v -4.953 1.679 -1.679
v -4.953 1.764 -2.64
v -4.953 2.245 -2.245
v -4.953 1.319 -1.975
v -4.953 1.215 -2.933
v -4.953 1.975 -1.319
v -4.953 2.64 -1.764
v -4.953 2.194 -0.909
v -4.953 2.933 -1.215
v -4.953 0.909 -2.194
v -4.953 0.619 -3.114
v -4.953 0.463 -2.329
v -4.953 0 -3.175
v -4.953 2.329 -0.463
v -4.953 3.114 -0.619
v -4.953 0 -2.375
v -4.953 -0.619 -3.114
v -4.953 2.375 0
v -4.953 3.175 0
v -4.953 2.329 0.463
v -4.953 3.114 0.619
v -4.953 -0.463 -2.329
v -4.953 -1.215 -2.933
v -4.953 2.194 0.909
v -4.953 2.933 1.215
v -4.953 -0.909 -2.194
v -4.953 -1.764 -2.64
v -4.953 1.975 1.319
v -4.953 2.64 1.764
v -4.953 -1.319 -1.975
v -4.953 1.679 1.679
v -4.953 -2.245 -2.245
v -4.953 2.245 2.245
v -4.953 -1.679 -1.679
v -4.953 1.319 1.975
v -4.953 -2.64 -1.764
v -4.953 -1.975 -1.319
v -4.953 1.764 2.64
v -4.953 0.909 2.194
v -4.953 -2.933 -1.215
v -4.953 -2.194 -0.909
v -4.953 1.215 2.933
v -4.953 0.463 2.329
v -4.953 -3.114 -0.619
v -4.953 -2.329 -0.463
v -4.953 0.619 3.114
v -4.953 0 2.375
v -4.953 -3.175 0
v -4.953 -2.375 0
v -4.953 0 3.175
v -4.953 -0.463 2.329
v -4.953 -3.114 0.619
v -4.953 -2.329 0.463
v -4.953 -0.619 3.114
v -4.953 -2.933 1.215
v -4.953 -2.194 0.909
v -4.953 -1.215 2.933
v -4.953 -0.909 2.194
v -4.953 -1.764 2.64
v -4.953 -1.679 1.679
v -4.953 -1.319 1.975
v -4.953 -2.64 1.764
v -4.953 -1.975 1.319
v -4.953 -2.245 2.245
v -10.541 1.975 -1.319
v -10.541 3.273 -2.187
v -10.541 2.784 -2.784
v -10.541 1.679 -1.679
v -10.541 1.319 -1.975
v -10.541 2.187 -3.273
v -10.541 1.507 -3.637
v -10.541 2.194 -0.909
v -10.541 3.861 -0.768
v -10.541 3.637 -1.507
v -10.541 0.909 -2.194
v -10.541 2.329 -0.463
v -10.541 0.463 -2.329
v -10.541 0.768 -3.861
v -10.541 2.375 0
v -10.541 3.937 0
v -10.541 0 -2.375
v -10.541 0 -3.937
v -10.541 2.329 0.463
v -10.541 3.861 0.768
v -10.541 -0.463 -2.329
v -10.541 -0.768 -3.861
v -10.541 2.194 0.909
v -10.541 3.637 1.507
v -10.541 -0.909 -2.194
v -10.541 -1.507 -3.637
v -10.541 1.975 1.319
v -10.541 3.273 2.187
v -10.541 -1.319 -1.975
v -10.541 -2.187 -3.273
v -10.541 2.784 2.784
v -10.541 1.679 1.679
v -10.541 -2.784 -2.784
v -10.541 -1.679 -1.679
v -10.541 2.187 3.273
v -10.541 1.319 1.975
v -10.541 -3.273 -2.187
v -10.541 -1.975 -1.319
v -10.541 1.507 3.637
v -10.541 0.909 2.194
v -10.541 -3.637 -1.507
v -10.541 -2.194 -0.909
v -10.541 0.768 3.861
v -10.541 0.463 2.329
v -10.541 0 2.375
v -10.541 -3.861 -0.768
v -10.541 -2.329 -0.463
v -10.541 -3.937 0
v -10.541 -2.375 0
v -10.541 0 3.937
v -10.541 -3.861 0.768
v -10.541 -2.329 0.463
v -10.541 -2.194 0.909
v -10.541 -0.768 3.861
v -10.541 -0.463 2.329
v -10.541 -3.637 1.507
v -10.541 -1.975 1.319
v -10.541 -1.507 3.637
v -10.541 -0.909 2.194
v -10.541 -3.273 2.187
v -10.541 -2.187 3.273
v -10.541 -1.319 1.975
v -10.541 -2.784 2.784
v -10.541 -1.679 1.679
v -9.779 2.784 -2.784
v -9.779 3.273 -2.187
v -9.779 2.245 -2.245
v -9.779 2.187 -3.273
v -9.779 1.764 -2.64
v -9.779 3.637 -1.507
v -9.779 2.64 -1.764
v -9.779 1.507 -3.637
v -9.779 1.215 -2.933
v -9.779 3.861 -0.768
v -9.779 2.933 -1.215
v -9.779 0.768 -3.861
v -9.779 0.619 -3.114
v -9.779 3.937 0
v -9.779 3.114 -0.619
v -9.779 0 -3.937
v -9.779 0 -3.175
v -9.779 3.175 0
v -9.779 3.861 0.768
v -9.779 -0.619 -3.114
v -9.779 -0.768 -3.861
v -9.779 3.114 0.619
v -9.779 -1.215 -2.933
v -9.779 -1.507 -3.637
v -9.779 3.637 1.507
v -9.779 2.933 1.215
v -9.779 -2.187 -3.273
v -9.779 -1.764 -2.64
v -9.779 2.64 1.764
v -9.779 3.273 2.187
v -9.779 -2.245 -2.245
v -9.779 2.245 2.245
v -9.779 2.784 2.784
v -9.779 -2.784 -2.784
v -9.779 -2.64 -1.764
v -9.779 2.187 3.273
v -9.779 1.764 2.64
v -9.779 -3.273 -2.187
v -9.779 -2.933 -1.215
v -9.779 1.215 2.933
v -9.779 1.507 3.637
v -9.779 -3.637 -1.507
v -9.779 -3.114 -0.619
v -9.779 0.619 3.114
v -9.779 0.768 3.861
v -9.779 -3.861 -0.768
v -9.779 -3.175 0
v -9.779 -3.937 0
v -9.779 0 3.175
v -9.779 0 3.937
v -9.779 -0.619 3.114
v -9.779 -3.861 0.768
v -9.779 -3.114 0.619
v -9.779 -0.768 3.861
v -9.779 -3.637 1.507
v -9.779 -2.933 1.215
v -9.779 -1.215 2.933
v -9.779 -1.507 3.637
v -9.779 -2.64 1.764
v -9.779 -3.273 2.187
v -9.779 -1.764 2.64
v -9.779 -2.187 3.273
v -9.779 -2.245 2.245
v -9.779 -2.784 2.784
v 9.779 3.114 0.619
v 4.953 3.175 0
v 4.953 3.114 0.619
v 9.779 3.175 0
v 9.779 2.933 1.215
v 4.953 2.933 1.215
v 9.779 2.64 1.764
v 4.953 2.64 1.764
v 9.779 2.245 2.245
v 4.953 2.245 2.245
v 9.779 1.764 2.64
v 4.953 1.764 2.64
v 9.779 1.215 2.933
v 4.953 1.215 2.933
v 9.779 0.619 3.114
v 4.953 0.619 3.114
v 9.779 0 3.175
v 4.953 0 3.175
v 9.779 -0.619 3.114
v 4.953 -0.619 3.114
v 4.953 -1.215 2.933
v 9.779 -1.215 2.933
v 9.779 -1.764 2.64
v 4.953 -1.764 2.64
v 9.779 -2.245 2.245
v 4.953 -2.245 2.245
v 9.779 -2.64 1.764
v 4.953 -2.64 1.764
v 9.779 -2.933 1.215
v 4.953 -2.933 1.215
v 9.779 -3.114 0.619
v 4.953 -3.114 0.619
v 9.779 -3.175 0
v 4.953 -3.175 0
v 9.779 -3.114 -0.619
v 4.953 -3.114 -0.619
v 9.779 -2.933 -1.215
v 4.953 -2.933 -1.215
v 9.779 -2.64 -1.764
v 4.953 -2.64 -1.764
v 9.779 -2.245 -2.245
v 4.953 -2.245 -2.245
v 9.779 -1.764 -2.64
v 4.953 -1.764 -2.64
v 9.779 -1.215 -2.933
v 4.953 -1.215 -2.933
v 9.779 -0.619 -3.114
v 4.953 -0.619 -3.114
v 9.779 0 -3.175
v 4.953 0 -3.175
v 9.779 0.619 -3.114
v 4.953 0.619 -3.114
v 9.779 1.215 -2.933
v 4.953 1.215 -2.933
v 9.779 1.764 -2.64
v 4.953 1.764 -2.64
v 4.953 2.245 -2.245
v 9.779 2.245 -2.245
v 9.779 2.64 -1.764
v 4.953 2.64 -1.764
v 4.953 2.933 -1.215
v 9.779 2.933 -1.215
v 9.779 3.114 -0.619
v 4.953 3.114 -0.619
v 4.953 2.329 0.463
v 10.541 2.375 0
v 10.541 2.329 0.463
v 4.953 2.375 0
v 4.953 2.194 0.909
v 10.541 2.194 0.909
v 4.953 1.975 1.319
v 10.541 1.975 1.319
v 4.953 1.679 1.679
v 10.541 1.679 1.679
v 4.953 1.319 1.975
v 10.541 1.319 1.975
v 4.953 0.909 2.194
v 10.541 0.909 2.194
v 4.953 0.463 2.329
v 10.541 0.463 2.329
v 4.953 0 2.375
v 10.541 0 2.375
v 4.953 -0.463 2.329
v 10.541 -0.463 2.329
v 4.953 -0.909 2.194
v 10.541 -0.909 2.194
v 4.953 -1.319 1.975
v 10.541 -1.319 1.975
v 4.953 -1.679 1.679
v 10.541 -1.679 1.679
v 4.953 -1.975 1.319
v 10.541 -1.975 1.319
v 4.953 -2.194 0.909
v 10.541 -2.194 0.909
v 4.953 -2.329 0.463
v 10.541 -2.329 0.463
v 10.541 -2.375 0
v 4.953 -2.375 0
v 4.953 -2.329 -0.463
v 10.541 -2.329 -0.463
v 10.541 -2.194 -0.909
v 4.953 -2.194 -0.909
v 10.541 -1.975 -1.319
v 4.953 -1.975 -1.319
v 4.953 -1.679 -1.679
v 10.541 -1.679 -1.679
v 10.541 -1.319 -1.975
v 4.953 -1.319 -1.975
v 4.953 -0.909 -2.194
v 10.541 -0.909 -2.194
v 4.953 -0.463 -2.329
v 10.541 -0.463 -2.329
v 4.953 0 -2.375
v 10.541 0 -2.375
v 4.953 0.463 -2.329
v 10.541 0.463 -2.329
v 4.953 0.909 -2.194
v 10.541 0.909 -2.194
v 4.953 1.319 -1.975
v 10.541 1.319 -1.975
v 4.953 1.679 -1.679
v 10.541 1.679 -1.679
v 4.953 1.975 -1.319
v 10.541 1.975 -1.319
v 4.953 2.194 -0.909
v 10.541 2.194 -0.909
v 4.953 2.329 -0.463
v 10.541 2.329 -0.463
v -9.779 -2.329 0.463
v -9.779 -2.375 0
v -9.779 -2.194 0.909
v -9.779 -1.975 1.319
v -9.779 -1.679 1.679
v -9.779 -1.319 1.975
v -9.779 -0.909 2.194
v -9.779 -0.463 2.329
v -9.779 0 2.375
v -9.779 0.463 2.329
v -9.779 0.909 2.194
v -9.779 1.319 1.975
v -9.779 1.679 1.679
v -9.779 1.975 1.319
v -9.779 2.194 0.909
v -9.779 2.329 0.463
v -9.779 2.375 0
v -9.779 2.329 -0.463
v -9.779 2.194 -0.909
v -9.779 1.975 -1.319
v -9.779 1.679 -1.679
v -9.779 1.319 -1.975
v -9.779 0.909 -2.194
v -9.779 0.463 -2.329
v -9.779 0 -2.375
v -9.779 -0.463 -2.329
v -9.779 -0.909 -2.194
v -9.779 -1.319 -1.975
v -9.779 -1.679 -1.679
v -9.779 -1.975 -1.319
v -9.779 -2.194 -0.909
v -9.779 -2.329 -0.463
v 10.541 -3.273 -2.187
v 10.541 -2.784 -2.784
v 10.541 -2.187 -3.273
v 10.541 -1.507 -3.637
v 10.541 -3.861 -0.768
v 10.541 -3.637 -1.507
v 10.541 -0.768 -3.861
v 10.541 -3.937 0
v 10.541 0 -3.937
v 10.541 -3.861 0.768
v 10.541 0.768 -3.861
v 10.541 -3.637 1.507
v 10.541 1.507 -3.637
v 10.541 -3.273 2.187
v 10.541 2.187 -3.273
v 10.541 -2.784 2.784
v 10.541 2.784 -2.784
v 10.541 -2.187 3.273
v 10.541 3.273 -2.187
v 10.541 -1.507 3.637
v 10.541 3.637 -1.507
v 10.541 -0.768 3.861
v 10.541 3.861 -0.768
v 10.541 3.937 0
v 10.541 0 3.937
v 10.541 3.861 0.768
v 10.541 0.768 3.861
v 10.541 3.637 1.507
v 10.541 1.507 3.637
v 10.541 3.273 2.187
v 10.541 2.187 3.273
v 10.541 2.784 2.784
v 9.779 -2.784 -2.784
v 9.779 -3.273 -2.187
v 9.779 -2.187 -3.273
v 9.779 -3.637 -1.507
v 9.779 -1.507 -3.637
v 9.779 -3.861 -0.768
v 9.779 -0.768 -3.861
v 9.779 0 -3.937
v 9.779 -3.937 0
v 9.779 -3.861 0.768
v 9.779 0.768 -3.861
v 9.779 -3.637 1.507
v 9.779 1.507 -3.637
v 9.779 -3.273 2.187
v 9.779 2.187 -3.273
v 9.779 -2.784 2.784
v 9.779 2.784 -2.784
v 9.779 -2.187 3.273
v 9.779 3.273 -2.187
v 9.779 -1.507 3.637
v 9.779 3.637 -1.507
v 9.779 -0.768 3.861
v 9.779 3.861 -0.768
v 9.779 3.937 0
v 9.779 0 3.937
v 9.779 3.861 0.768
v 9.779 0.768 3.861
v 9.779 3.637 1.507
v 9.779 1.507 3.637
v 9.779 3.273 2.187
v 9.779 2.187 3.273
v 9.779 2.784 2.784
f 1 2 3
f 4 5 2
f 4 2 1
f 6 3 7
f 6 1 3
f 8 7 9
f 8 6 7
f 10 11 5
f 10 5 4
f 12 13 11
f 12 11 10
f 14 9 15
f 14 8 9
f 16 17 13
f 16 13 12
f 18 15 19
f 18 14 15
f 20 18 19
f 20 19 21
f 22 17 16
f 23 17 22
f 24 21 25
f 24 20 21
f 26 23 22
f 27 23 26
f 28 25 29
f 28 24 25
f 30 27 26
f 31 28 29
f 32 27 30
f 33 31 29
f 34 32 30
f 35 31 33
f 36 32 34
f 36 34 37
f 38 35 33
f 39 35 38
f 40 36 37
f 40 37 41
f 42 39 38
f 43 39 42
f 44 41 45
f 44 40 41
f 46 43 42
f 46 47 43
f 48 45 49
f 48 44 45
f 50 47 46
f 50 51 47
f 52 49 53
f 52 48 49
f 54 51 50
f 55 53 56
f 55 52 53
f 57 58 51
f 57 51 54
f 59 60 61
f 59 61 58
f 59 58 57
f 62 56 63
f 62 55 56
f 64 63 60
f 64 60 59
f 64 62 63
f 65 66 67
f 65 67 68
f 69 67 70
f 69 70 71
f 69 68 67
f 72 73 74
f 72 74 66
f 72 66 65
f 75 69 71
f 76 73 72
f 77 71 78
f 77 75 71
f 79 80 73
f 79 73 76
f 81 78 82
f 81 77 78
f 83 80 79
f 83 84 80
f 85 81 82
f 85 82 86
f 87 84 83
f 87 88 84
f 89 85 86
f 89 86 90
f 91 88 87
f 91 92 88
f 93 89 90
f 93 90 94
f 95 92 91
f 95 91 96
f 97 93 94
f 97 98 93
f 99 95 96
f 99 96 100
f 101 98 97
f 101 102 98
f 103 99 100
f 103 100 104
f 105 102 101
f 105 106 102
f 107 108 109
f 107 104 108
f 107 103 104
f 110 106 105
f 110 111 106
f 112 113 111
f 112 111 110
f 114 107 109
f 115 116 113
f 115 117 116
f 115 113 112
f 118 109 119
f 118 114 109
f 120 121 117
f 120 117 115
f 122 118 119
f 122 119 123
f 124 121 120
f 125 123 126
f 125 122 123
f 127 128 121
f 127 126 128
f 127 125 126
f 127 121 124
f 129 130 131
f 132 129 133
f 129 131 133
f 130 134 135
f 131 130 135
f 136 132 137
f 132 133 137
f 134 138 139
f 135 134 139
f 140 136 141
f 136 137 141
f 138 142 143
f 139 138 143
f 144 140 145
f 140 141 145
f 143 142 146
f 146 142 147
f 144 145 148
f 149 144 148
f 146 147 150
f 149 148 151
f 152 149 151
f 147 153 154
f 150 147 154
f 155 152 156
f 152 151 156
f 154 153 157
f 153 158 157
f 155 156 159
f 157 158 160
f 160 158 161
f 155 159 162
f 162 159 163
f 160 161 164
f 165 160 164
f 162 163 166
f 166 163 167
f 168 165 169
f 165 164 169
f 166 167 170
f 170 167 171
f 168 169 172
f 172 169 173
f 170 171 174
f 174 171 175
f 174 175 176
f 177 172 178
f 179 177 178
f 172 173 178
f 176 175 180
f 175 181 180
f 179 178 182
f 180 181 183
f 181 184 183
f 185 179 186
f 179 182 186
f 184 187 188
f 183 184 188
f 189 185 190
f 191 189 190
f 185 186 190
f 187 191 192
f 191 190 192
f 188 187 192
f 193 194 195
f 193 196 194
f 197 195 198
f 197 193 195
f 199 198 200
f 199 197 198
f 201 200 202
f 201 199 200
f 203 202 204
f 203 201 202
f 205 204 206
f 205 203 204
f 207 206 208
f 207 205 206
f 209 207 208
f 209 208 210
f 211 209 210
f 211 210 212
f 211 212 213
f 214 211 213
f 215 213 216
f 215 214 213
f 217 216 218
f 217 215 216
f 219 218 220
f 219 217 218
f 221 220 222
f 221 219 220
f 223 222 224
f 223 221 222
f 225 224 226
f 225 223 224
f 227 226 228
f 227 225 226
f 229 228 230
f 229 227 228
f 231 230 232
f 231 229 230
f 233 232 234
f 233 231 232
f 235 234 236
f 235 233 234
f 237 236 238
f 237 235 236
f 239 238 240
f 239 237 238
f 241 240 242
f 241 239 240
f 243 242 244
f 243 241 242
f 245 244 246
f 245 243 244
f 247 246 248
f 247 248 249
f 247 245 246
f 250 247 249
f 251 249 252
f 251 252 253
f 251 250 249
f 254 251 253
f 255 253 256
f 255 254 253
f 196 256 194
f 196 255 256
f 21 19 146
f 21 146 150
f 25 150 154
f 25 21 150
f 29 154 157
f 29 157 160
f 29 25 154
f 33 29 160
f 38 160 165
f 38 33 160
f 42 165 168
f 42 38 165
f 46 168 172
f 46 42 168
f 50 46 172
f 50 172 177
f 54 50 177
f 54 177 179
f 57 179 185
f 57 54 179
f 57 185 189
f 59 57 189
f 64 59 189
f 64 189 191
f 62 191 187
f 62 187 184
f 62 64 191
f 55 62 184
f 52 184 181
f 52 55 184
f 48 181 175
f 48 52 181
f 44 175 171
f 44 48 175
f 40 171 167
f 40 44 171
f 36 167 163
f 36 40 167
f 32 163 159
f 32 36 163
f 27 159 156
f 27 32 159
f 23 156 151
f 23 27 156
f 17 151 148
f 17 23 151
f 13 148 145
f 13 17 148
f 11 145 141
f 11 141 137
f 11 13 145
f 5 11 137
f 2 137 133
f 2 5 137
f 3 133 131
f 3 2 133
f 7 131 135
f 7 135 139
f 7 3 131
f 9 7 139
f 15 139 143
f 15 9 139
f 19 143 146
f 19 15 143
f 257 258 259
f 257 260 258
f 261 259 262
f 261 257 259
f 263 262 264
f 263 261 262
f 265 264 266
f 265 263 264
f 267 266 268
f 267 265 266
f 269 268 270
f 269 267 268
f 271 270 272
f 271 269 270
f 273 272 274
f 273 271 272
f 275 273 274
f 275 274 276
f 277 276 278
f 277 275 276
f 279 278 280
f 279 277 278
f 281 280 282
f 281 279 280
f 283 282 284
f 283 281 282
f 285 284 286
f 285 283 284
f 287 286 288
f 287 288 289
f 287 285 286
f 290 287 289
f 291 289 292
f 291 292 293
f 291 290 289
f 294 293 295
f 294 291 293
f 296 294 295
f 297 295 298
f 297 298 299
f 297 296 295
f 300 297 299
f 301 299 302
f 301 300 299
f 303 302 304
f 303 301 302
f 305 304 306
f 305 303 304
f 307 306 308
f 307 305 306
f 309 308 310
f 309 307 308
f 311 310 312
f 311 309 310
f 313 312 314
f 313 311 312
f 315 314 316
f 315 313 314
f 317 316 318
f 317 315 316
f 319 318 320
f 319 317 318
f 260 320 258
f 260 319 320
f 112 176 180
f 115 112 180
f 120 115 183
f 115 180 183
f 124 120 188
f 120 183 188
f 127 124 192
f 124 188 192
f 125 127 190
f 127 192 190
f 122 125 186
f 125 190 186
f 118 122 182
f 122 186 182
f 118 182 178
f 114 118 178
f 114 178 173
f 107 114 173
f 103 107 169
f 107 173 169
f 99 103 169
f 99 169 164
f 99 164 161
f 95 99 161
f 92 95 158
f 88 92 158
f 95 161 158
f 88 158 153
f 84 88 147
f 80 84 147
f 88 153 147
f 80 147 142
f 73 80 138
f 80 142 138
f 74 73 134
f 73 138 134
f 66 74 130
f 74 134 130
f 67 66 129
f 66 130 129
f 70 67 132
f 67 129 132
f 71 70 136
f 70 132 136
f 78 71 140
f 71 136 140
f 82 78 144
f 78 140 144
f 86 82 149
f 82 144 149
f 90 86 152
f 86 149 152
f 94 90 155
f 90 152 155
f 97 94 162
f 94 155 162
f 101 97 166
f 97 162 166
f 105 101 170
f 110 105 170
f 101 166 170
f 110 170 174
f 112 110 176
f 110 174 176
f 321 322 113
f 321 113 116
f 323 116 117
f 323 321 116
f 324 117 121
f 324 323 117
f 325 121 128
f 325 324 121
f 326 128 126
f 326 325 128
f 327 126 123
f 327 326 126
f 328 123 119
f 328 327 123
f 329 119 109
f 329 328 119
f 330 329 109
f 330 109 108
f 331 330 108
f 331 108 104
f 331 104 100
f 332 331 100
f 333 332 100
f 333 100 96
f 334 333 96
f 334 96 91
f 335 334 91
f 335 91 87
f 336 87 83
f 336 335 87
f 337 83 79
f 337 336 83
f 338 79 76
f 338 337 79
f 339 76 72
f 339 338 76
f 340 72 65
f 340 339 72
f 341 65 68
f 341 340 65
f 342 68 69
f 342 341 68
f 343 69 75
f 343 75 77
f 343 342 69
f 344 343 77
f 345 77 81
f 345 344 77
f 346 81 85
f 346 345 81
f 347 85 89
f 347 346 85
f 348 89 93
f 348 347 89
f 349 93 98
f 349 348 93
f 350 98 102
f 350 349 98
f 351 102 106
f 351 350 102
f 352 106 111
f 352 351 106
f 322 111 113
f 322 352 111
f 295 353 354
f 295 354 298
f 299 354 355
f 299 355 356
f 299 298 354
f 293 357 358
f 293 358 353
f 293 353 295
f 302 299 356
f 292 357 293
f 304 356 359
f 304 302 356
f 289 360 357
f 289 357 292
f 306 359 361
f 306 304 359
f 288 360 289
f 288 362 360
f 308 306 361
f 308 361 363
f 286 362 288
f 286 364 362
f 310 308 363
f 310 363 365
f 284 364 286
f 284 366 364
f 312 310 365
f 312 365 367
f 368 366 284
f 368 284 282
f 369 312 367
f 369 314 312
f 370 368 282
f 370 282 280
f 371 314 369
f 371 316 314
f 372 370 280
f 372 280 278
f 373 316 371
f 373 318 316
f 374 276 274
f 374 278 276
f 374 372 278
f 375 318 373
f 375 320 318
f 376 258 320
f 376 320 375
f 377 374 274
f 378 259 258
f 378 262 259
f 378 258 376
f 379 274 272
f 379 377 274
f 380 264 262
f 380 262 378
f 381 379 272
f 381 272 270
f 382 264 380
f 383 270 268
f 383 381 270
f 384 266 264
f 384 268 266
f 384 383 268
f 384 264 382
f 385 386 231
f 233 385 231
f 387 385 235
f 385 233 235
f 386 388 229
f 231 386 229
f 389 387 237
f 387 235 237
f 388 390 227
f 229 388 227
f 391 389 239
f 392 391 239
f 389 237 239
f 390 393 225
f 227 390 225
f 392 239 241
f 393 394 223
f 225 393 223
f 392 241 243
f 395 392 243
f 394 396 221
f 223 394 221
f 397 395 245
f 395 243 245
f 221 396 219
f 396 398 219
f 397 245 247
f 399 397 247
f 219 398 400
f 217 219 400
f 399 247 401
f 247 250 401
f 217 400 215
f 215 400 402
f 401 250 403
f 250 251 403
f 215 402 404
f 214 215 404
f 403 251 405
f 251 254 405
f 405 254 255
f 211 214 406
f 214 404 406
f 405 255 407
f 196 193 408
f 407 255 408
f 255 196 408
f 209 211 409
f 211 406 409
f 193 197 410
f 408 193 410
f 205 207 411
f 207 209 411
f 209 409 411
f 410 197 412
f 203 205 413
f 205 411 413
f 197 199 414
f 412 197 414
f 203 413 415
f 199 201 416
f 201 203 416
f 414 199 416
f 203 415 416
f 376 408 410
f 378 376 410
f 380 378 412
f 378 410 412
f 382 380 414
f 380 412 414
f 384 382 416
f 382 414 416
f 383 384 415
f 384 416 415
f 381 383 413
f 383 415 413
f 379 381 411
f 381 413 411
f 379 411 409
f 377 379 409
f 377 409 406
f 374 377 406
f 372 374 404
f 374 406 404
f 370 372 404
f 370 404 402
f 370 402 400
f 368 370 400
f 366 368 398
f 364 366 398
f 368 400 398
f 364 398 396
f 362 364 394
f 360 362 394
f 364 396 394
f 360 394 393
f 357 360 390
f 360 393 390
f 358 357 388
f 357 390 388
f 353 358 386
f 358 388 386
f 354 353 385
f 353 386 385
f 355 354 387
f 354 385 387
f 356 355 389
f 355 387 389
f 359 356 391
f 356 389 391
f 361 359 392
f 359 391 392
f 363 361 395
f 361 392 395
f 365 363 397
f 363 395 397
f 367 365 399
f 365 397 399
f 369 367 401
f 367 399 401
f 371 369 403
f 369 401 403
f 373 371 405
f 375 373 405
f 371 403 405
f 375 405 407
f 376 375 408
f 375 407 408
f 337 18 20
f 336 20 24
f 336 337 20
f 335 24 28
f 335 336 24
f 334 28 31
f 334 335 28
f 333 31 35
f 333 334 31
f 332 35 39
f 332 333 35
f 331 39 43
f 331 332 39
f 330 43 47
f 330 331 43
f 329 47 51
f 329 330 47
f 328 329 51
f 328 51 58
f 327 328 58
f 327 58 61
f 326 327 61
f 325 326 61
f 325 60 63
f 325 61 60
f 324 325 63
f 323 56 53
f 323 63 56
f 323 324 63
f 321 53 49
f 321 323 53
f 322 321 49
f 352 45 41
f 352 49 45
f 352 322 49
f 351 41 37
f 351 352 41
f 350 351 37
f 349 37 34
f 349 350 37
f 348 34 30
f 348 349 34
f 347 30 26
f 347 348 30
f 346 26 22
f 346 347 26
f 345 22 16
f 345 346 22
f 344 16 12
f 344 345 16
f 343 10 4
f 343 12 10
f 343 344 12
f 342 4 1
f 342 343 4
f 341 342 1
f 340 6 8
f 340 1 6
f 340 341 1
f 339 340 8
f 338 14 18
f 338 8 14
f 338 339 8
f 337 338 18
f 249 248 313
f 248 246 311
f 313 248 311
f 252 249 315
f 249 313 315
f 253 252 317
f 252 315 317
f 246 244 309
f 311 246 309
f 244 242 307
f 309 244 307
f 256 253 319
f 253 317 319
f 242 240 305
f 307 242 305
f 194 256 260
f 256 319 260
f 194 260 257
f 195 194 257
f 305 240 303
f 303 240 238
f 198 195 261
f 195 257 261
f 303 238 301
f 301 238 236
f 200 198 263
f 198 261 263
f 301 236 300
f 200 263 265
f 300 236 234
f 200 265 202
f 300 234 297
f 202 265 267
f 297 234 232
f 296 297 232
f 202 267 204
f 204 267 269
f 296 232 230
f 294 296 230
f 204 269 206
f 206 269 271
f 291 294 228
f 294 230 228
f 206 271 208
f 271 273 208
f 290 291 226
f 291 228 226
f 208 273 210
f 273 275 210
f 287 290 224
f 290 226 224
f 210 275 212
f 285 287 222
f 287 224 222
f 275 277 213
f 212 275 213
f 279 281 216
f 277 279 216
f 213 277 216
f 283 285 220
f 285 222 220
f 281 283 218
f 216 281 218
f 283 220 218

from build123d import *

# Parameters (mm, degrees)
F0_R     = 3.175
F0_R_2   = 2.3749
F1_DEPTH = 9.779
F2_R     = 3.937
F2_R_2   = 3.175
F2_R_3   = 2.3749
F3_DEPTH = 0.762
F4_R     = 3.937
F4_R_2   = 3.175
F4_R_3   = 2.3749
F5_DEPTH = 0.762
F6_W     = 9.906
F6_H     = 12.6722976956
F7_DEPTH = 12.7


with BuildPart() as f1:
    # F0 (on Right) → F1 (new body, symmetric)
    with BuildSketch(Plane.YZ):
        Circle(F0_R)
        Circle(F0_R_2, mode=Mode.SUBTRACT)
    extrude(amount=F1_DEPTH, both=True)

    # F2 (on face) → F3 (join)
    with BuildSketch(Plane.YZ.offset(9.779)):
        Circle(F2_R)
        Circle(F2_R_2, mode=Mode.SUBTRACT)
        Circle(F2_R_2)
        Circle(F2_R_3, mode=Mode.SUBTRACT)
    extrude(amount=F3_DEPTH)

    # F4 (on face) → F5 (join)
    with BuildSketch(Plane(origin=(-9.779, 0, 0), x_dir=(0, -1, 0), z_dir=(-1, 0, 0))):
        Circle(F4_R)
        Circle(F4_R_2, mode=Mode.SUBTRACT)
        Circle(F4_R_2)
        Circle(F4_R_3, mode=Mode.SUBTRACT)
    extrude(amount=F5_DEPTH)

    # F6 (on Front) → F7 (cut, symmetric)
    with BuildSketch(Plane.XZ):
        Rectangle(F6_W, F6_H)
    extrude(amount=F7_DEPTH, both=True, mode=Mode.SUBTRACT)


solid = f1.part
